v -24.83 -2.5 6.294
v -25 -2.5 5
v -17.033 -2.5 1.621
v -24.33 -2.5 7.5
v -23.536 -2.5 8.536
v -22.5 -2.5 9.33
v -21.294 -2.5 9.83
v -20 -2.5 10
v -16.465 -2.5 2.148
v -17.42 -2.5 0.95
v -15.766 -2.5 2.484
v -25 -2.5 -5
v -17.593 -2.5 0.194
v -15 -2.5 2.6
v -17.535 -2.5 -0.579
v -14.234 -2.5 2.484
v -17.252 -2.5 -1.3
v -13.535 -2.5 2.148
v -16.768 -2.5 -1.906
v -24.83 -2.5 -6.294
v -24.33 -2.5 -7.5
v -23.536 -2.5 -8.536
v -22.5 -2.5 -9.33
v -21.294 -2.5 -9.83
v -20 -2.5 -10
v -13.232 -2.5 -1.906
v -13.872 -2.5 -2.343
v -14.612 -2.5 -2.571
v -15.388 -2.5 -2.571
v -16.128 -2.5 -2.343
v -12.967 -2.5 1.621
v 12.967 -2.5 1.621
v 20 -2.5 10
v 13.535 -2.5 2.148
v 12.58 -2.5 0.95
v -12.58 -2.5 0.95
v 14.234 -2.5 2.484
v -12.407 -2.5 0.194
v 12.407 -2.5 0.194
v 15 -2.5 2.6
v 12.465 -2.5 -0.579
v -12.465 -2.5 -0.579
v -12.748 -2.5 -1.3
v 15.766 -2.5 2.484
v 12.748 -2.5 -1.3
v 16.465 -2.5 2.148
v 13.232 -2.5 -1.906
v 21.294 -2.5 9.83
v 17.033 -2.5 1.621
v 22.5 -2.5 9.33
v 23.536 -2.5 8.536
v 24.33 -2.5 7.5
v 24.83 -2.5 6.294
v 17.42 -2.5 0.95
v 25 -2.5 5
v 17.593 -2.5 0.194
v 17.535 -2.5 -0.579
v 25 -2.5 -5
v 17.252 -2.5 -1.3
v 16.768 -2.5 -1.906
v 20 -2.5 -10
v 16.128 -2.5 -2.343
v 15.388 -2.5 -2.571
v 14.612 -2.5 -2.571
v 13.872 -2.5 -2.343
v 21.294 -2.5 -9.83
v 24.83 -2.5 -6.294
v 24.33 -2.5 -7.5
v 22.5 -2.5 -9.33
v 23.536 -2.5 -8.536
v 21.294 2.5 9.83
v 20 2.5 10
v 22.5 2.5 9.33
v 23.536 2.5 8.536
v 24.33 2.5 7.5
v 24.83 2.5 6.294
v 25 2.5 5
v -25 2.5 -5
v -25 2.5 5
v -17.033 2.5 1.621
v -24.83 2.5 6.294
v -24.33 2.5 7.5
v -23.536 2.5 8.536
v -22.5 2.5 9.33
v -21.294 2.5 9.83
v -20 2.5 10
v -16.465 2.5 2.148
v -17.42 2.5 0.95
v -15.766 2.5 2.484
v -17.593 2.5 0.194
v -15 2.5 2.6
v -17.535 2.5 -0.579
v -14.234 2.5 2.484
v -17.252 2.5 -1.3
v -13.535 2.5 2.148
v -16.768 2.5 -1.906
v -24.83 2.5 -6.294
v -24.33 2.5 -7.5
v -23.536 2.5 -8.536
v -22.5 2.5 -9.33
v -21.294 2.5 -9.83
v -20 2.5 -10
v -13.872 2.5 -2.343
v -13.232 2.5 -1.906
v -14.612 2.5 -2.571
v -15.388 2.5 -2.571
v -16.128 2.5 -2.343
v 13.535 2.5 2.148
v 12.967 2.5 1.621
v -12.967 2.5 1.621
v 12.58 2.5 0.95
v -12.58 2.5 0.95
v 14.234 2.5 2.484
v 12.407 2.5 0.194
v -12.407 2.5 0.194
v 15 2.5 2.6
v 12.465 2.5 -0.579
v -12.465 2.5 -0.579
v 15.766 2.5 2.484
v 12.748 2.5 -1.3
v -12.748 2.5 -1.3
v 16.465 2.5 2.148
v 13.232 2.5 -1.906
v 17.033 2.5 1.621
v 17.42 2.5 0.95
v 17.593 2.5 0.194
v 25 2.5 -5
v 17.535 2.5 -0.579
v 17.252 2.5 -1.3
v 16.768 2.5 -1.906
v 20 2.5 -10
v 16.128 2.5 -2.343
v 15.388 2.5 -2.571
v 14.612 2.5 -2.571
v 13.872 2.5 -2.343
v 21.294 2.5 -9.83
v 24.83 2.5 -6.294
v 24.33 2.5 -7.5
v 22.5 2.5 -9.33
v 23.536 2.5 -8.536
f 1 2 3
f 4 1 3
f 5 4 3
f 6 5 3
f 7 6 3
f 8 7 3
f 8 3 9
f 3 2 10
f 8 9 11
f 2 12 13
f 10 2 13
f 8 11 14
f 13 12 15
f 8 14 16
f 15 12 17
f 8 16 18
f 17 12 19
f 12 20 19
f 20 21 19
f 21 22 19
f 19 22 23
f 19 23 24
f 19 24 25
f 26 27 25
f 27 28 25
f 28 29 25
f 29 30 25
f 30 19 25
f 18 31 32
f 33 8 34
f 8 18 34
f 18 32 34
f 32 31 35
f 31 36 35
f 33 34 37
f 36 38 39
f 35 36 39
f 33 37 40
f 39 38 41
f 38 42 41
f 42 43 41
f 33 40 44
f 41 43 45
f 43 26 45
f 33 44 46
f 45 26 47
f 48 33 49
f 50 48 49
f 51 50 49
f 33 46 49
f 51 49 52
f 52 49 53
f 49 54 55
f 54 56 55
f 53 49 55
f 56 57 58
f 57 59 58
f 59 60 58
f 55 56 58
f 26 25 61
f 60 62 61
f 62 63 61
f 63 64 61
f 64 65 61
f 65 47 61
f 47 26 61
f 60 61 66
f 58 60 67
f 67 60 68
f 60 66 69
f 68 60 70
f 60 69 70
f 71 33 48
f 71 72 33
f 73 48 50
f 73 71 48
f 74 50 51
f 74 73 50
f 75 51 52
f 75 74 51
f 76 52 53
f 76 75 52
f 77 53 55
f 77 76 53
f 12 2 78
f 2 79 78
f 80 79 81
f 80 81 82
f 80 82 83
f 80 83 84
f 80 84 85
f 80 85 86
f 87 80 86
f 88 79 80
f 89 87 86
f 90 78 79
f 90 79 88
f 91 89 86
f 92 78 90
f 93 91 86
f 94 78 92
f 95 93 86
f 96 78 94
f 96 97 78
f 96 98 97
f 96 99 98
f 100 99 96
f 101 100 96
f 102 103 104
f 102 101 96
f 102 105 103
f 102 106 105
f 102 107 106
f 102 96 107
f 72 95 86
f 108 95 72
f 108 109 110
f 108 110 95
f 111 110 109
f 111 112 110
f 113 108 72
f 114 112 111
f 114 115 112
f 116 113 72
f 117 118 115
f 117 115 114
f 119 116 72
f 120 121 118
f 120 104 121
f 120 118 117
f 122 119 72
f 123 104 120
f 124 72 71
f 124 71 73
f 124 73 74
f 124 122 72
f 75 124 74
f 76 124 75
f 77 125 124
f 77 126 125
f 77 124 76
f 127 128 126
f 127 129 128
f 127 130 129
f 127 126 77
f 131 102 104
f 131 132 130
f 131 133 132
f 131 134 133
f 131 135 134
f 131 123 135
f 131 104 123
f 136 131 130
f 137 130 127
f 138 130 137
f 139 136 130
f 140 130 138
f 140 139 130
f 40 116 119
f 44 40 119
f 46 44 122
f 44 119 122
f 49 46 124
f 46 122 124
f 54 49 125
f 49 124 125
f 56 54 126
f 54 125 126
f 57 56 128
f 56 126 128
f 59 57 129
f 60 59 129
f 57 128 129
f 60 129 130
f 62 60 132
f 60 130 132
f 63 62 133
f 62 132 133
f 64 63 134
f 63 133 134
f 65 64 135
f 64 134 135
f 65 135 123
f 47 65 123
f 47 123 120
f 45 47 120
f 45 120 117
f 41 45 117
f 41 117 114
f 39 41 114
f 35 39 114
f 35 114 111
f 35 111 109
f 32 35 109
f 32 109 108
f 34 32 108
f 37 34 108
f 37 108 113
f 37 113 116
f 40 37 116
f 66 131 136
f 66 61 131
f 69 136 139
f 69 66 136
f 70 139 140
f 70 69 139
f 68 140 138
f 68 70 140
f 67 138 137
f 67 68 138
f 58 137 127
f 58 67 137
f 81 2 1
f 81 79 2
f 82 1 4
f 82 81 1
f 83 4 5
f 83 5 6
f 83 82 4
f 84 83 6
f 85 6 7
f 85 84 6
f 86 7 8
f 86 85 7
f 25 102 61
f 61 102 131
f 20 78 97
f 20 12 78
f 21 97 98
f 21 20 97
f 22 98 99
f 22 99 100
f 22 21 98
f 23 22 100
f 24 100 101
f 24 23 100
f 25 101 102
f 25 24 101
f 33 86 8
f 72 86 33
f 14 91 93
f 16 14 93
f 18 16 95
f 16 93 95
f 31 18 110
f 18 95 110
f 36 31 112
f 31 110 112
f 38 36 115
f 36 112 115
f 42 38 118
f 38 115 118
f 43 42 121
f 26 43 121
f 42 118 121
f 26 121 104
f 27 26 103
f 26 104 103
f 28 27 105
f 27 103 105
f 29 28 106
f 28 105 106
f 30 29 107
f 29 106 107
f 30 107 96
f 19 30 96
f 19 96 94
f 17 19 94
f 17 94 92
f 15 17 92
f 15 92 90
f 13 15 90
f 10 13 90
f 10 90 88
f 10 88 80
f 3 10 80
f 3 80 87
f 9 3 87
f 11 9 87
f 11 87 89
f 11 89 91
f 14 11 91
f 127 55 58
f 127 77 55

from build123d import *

# Parameters (mm, degrees)
ESBO_O1_W                = 50
ESBO_O1_H                = 20
RESSALTO_EXTRUS_O1_DEPTH = 2.5
ESBO_O2_R                = 2.6
CORTE_EXTRUS_O1_DEPTH    = 6
FILETE1_R                = 5


with BuildPart() as part:
    # Esboço1 → Ressalto-extrusão1 (new, symmetric)
    with BuildSketch(Plane(origin=(0, 0, 0), x_dir=(1, 0, 0), z_dir=(0, 1, 0))):
        Rectangle(ESBO_O1_W, ESBO_O1_H)
    extrude(amount=RESSALTO_EXTRUS_O1_DEPTH, both=True)

    # Esboço2 → Corte-extrusão1 (cut)
    with BuildSketch(Plane(origin=(0, 2.5, 0), x_dir=(1, 0, 0), z_dir=(0, 1, 0))):
        with Locations(Location((-15, 0, 0), (0, 0, 270))):
            Circle(ESBO_O2_R)
        with Locations(Location((15, 0, 0), (0, 0, 270))):
            Circle(ESBO_O2_R)
    extrude(amount=-CORTE_EXTRUS_O1_DEPTH, mode=Mode.SUBTRACT)

    # Filete1
    filete1_edges = [part.edges().sort_by_distance(p)[0] for p in [
        (25, 0, 10),
        (-25, 0, 10),
        (-25, 0, -10),
        (25, 0, -10),
    ]]
    fillet(filete1_edges, radius=FILETE1_R)


solid = part.part
